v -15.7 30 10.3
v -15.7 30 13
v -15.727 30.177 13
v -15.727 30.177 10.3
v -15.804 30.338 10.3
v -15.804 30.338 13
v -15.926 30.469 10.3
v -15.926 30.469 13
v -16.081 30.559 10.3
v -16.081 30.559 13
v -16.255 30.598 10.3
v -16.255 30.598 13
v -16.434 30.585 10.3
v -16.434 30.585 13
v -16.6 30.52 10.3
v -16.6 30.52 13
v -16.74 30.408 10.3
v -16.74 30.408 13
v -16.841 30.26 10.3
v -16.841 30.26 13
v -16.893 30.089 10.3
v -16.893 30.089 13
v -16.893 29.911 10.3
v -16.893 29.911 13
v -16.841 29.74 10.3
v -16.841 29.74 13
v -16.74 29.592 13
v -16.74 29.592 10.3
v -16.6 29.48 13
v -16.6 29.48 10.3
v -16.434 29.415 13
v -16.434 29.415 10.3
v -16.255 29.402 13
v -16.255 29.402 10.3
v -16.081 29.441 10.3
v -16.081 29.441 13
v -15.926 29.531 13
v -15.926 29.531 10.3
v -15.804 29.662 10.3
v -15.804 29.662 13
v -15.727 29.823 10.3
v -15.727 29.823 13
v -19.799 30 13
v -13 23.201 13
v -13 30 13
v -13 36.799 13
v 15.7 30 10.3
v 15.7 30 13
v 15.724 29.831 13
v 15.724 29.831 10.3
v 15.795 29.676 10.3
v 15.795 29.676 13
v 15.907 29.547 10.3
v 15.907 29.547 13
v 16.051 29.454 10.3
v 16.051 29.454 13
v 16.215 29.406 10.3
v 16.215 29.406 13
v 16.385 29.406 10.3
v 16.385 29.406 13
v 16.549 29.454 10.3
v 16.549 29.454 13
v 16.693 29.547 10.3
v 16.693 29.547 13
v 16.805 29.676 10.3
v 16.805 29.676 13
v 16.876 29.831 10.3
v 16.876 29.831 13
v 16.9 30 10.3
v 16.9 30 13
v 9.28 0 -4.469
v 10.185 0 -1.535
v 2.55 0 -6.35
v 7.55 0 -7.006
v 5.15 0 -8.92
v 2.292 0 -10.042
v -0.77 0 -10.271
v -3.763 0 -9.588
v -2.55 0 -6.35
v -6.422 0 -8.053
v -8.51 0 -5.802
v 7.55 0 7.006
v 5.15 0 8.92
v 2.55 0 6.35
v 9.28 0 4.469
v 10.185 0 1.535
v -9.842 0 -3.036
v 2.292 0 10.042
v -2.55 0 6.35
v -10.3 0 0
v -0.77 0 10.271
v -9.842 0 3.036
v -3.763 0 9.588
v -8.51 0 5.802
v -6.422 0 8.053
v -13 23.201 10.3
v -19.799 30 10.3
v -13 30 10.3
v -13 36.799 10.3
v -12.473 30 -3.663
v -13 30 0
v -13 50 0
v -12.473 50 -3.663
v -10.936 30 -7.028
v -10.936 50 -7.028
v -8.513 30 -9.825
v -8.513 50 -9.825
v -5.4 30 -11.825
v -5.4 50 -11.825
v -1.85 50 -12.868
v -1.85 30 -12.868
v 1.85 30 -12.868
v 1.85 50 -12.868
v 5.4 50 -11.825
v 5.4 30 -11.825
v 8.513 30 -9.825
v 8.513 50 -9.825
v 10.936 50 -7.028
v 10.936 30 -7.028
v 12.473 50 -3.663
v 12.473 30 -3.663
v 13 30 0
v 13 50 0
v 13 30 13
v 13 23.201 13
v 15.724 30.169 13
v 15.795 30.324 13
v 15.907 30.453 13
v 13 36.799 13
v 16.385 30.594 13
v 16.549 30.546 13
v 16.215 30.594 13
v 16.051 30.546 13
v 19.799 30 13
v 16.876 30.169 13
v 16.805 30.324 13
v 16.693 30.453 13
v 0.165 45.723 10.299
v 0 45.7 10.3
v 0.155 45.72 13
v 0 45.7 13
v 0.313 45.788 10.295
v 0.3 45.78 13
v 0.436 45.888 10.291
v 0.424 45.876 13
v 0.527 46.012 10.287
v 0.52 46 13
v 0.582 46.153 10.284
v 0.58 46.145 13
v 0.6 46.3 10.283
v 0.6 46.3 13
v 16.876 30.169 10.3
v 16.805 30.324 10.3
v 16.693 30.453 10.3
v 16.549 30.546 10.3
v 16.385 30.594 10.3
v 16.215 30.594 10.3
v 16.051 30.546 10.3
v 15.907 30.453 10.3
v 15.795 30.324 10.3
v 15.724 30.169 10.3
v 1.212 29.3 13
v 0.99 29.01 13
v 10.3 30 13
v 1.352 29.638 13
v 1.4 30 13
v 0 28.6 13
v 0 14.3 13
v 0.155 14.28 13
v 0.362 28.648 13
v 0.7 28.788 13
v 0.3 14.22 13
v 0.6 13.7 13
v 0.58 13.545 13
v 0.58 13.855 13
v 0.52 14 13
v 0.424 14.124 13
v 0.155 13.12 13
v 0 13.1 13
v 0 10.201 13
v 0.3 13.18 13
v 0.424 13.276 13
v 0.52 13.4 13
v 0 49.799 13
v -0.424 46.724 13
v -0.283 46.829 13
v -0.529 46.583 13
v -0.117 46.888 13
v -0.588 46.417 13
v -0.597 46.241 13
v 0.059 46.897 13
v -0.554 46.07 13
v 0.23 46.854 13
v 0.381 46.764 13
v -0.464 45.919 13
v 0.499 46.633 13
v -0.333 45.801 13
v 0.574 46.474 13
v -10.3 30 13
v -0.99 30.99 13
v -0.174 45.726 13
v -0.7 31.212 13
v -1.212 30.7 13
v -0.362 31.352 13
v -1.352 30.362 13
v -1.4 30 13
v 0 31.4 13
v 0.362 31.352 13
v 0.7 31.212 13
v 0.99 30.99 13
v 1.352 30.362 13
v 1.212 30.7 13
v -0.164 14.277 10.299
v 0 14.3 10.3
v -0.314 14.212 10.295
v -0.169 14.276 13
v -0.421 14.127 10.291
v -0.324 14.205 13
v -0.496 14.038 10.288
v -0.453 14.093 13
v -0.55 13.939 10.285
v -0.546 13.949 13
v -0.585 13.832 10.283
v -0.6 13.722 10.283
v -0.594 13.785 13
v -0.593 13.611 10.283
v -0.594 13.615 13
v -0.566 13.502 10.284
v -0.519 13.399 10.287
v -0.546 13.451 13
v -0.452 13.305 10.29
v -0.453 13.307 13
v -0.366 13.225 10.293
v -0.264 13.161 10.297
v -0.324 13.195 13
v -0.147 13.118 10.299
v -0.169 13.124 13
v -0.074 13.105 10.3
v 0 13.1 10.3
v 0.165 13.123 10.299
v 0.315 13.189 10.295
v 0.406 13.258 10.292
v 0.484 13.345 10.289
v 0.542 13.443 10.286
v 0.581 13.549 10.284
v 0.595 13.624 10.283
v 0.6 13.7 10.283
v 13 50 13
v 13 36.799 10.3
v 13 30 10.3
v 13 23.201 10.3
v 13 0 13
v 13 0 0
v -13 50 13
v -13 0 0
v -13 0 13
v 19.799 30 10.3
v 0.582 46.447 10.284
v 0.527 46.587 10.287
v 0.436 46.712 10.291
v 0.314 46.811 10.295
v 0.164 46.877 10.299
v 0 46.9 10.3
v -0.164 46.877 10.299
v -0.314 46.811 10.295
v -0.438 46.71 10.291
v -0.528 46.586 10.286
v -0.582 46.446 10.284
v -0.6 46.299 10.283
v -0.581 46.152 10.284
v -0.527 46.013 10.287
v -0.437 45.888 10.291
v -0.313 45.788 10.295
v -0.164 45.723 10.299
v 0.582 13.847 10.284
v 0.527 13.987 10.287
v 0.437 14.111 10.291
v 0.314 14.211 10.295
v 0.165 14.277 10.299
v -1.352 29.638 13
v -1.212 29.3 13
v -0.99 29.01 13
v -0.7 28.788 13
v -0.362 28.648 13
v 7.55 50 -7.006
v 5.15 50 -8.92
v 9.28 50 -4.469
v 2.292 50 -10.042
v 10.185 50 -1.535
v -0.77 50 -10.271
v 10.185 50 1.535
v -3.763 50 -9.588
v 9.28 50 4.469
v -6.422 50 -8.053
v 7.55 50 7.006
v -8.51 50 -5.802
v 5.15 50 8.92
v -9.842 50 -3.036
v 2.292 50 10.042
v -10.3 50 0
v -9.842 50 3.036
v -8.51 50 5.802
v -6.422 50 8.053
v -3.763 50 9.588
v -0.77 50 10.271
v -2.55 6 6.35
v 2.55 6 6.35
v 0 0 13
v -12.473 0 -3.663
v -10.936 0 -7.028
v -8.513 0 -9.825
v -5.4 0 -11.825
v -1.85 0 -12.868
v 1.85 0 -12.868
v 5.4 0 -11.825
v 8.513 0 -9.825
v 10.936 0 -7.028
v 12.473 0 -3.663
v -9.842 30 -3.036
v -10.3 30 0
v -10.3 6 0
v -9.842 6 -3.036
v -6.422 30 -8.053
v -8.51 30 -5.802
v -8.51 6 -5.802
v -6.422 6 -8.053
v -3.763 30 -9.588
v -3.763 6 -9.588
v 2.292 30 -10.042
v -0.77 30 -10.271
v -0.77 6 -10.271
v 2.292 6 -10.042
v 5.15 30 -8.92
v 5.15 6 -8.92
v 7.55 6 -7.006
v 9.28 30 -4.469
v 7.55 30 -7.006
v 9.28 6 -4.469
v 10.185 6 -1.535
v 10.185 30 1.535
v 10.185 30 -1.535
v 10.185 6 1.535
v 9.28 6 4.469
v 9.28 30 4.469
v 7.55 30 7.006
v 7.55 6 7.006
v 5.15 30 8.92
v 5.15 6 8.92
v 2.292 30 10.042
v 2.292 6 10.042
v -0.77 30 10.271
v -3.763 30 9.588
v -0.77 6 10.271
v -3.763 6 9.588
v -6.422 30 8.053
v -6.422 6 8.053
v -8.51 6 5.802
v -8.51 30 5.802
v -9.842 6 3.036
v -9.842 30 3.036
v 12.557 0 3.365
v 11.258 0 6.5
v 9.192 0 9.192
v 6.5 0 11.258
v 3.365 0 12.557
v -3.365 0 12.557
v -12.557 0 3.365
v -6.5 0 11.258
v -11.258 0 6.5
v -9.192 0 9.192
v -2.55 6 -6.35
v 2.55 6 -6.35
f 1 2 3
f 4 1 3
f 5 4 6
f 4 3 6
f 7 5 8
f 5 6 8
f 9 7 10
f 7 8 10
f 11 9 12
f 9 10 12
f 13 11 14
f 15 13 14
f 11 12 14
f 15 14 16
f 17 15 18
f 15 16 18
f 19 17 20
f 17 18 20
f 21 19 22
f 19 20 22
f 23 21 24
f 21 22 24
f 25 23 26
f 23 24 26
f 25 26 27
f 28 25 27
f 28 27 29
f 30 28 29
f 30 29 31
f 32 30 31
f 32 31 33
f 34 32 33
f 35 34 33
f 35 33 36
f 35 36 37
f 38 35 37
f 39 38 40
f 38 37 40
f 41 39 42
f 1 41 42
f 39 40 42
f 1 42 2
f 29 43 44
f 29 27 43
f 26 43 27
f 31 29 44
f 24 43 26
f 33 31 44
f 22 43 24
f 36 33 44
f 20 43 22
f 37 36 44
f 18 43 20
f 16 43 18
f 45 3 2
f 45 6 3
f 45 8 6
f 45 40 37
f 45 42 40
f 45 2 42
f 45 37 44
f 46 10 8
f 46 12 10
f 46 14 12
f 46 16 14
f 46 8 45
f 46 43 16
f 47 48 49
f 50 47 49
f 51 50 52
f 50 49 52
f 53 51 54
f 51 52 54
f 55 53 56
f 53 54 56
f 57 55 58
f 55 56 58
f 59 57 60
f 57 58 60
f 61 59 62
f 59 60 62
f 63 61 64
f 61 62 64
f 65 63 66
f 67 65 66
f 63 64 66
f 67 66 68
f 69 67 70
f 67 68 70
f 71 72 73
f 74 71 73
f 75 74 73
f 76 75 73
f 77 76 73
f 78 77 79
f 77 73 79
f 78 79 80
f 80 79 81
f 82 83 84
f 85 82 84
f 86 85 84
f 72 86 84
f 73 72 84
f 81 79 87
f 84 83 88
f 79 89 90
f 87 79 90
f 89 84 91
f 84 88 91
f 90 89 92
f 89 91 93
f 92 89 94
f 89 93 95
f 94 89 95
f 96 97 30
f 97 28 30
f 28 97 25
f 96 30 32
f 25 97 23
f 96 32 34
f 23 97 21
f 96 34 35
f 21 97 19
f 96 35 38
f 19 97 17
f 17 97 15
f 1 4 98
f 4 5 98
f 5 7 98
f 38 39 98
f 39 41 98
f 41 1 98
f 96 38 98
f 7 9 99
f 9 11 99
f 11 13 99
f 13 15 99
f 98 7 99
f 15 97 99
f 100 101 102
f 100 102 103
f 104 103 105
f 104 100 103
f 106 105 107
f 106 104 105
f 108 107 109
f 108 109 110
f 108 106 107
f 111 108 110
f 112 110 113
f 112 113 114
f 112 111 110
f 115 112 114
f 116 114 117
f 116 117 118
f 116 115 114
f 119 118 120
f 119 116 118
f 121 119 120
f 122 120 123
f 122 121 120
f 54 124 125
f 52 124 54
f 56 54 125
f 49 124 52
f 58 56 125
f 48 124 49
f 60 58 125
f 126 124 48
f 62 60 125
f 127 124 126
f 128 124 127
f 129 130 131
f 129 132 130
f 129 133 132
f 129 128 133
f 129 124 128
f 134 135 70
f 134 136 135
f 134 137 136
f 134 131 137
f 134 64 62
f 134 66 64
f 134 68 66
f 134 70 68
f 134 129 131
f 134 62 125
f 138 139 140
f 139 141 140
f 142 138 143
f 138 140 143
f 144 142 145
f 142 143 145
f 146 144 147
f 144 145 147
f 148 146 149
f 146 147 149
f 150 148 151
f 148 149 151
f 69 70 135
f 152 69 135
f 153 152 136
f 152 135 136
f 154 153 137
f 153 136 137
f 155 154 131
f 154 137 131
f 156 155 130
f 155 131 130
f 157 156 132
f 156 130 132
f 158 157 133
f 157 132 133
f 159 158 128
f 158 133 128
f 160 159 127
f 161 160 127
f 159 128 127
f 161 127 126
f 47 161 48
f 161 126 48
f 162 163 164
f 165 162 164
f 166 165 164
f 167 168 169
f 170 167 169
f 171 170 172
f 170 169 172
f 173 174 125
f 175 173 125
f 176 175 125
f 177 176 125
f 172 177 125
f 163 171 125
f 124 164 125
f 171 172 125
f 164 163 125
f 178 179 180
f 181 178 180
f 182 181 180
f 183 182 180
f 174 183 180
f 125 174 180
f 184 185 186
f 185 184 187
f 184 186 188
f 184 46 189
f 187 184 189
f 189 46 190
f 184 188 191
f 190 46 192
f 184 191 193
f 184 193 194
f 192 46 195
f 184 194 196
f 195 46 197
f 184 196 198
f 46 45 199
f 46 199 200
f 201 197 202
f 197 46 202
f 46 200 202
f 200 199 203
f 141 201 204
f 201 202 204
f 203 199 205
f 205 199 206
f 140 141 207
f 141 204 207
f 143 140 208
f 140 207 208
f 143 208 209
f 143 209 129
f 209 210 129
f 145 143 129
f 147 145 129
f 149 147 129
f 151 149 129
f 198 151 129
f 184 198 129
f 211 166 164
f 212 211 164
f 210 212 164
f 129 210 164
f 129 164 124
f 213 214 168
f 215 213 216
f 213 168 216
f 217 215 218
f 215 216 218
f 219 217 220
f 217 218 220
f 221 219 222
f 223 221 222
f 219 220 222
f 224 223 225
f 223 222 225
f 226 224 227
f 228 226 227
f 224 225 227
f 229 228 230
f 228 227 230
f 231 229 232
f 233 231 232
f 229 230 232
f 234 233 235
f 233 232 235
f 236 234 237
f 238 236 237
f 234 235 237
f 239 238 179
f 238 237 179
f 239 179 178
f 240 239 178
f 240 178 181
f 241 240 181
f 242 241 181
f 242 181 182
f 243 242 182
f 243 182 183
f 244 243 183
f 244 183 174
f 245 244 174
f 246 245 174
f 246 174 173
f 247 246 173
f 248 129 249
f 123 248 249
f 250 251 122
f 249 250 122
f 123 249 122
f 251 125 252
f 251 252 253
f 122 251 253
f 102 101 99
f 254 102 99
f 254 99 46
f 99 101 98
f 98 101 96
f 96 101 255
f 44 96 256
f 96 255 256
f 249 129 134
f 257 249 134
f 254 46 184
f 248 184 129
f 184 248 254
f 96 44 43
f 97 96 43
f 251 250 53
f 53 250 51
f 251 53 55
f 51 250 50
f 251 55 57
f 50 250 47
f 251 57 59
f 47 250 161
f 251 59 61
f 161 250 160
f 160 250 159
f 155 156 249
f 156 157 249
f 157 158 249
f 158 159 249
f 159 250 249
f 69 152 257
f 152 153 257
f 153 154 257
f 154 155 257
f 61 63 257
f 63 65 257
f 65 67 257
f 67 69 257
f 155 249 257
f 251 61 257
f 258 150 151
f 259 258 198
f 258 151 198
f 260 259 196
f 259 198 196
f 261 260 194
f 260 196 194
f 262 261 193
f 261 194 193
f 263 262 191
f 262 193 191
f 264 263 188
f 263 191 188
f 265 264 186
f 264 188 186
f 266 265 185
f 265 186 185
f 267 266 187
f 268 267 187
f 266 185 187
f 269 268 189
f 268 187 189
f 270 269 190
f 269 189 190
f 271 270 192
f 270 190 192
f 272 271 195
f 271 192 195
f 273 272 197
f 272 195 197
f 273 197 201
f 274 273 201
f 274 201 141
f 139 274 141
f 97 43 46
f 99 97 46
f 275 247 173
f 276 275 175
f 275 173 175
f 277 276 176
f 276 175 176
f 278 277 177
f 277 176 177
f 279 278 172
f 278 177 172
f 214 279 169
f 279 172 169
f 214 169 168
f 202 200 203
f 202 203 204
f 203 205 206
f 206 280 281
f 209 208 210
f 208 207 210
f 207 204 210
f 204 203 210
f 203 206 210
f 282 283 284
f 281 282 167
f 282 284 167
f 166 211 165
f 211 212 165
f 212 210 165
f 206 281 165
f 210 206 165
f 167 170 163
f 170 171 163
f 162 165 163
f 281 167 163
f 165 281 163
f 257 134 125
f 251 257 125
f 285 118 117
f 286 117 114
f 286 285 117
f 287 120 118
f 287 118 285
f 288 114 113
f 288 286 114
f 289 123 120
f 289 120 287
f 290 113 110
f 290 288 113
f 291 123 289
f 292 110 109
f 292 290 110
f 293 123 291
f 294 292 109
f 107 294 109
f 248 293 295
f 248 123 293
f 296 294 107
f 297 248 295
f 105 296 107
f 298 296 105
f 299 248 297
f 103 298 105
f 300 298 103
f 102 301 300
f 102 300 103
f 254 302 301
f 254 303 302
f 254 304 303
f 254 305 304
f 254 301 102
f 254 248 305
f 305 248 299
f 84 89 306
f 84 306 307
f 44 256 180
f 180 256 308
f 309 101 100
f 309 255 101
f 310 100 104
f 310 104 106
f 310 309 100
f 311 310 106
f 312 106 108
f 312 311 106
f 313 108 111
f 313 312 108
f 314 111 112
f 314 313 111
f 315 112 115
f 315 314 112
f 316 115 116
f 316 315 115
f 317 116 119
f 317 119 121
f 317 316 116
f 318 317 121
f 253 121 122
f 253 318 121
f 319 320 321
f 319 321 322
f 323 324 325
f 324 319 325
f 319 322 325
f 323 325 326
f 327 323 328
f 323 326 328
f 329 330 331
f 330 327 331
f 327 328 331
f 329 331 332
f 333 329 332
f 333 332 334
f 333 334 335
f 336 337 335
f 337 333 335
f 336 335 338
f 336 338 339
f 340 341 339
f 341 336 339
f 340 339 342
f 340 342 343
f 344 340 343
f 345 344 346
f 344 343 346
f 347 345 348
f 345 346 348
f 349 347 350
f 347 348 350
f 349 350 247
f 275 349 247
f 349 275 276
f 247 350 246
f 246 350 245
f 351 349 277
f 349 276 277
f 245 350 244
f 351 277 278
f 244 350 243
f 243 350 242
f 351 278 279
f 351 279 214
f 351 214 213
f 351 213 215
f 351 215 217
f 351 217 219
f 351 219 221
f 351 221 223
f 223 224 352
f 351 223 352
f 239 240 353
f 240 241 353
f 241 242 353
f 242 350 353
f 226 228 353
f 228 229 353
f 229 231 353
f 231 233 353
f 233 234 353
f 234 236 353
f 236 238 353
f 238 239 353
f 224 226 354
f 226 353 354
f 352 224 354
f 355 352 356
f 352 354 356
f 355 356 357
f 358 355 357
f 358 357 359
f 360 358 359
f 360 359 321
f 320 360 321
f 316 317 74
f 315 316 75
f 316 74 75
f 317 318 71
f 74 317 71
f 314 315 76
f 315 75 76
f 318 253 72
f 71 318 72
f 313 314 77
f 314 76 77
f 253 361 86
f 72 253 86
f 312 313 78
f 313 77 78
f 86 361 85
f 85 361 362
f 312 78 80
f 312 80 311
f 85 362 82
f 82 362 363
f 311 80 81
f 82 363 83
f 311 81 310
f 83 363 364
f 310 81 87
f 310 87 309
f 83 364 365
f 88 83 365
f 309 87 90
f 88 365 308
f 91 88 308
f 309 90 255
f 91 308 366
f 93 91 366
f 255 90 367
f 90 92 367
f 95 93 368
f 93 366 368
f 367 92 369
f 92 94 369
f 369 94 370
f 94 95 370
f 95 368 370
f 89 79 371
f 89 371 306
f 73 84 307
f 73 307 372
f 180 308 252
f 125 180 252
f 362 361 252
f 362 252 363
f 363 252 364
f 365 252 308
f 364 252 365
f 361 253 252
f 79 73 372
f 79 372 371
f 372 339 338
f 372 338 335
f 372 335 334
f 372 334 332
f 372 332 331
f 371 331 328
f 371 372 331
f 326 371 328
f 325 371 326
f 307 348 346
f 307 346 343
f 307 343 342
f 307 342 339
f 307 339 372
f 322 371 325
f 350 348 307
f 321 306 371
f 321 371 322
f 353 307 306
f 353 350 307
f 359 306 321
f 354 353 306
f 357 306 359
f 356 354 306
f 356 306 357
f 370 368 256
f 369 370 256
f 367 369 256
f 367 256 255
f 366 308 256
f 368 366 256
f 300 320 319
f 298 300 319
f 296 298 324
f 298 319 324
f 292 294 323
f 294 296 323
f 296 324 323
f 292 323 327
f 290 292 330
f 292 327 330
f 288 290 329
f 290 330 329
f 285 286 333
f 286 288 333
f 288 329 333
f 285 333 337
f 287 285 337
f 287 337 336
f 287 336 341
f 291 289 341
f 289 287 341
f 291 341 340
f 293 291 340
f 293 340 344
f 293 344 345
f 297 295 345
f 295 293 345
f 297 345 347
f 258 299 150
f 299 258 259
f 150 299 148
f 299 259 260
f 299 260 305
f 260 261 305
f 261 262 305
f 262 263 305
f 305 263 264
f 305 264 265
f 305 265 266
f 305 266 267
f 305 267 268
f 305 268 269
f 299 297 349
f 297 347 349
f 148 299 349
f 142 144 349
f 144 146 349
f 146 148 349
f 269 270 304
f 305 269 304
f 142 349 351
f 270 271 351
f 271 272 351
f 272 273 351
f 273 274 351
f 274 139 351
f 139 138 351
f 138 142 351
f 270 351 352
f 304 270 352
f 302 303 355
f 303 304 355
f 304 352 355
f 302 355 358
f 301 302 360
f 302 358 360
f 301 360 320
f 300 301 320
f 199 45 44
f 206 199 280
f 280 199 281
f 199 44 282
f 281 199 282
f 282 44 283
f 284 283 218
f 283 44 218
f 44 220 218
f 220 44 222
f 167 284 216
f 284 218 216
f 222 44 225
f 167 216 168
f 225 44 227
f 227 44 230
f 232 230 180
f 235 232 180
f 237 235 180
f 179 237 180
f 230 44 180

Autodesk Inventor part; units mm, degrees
ref_plane "YZ Plane" through (0, 0, 0) normal (1, 0, 0) x (0, 1, 0)
ref_plane "XZ Plane" through (0, 0, 0) normal (0, 1, 0) x (-1, 0, 0)
sketch "草图1" plane through (0, 0, 0) normal (0, 1, 0) x (-1, 0, 0)
  circle A0 centre (0, 0) radius 10.3
  circle A1 centre (0, 0) radius 13
  line L0 (2.55, 6.35) -> (-2.55, 6.35)
  line L1 (-2.55, 6.35) -> (-2.55, -6.35)
  line L2 (-2.55, -6.35) -> (2.55, -6.35)
  line L3 (2.55, -6.35) -> (2.55, 6.35)
  line L4 (2.55, 6.35) -> (-2.55, -6.35) construction
  line L5 (-2.55, 6.35) -> (2.55, -6.35) construction
  line L6 (13, 13) -> (-13, 13)
  line L7 (-13, 13) -> (-13, -13)
  line L8 (-13, -13) -> (13, -13)
  line L9 (13, -13) -> (13, 13)
  line L10 (13, 13) -> (-13, -13) construction
  line L11 (-13, 13) -> (13, -13) construction
  point P0 (13, 0)
  point P1 (0, 13)
  point P2 (-13, 0)
  dimension "d0" = 20.6
  dimension "d1" = 26
  dimension "d2" = 5.1
  dimension "d3" = 12.7
extrude "拉伸1" add sketch "草图1" along normal blind 6 contours A0
extrude "拉伸2" add sketch "草图1" along normal blind 30 contours A1
ref_plane "工作平面1" through (0, 0, 13) normal (0, 0, 1) x (1, 0, 0)
sketch "草图2" plane through (0, 0, 13) normal (0, 0, 1) x (1, 0, 0)
  line L0 (-10.3, 30) -> (10.3, 30) projected
  circle A0 centre (0, 30) radius 1.4
  line L1 (0, 30) -> (0, 46.3)
  line L2 (0, 30) -> (0, 13.7)
  circle A1 centre (0, 13.7) radius 0.6
  circle A2 centre (0, 46.3) radius 0.6
  line L3 (0, 30) -> (16.3, 30)
  line L4 (0, 30) -> (-16.3, 30)
  line L5 (13, 30) -> (-13, 30) projected
  circle A3 centre (16.3, 30) radius 0.6
  circle A4 centre (-16.3, 30) radius 0.6
  line L6 (19.799, 30) -> (0, 10.201)
  line L7 (0, 10.201) -> (-19.799, 30)
  line L8 (-19.799, 30) -> (0, 49.799)
  line L9 (0, 49.799) -> (19.799, 30)
  line L10 (-14, 44) -> (14, 16) construction
  line L11 (14, 44) -> (-14, 16) construction
  point P0 (0, 0)
  dimension "d9" = 2.8
  dimension "d10" = 16.3
  dimension "d11" = 16.3
  dimension "d12" = 1.2
  dimension "d13" = 1.2
  dimension "d14" = 16.3
  dimension "d15" = 16.3
  dimension "d16" = 1.2
  dimension "d17" = 1.2
  dimension "d20" = 28
  dimension "d21" = 28
extrude "拉伸3" add sketch "草图1" along normal blind 50 contours A1 | A1 L6 L9 | A1 L7 L6
extrude "拉伸4" add sketch "草图2" against normal blind 2.7
extrude "拉伸5" cut sketch "草图2" against normal blind 10 contours A2
extrude "拉伸6" cut sketch "草图2" against normal blind 10 contours A1
equation "\"折弯半径\" = 厚度"
equation "\"最小余量\" = 2 * 厚度"
equation "\"过渡半径\" = 折弯半径"
equation "\"间隙大小\" = 厚度"
equation "\"折弯释压宽度\" = 厚度"
equation "\"折弯释压深度\" = 0.5 * 厚度"
equation "\"拐角释压尺寸\" = 4 * 厚度"
equation "\"Jacobi半径尺寸\" = 折弯半径"
equation "\"厚度\" = 0.5"
properties part number "固定件"
